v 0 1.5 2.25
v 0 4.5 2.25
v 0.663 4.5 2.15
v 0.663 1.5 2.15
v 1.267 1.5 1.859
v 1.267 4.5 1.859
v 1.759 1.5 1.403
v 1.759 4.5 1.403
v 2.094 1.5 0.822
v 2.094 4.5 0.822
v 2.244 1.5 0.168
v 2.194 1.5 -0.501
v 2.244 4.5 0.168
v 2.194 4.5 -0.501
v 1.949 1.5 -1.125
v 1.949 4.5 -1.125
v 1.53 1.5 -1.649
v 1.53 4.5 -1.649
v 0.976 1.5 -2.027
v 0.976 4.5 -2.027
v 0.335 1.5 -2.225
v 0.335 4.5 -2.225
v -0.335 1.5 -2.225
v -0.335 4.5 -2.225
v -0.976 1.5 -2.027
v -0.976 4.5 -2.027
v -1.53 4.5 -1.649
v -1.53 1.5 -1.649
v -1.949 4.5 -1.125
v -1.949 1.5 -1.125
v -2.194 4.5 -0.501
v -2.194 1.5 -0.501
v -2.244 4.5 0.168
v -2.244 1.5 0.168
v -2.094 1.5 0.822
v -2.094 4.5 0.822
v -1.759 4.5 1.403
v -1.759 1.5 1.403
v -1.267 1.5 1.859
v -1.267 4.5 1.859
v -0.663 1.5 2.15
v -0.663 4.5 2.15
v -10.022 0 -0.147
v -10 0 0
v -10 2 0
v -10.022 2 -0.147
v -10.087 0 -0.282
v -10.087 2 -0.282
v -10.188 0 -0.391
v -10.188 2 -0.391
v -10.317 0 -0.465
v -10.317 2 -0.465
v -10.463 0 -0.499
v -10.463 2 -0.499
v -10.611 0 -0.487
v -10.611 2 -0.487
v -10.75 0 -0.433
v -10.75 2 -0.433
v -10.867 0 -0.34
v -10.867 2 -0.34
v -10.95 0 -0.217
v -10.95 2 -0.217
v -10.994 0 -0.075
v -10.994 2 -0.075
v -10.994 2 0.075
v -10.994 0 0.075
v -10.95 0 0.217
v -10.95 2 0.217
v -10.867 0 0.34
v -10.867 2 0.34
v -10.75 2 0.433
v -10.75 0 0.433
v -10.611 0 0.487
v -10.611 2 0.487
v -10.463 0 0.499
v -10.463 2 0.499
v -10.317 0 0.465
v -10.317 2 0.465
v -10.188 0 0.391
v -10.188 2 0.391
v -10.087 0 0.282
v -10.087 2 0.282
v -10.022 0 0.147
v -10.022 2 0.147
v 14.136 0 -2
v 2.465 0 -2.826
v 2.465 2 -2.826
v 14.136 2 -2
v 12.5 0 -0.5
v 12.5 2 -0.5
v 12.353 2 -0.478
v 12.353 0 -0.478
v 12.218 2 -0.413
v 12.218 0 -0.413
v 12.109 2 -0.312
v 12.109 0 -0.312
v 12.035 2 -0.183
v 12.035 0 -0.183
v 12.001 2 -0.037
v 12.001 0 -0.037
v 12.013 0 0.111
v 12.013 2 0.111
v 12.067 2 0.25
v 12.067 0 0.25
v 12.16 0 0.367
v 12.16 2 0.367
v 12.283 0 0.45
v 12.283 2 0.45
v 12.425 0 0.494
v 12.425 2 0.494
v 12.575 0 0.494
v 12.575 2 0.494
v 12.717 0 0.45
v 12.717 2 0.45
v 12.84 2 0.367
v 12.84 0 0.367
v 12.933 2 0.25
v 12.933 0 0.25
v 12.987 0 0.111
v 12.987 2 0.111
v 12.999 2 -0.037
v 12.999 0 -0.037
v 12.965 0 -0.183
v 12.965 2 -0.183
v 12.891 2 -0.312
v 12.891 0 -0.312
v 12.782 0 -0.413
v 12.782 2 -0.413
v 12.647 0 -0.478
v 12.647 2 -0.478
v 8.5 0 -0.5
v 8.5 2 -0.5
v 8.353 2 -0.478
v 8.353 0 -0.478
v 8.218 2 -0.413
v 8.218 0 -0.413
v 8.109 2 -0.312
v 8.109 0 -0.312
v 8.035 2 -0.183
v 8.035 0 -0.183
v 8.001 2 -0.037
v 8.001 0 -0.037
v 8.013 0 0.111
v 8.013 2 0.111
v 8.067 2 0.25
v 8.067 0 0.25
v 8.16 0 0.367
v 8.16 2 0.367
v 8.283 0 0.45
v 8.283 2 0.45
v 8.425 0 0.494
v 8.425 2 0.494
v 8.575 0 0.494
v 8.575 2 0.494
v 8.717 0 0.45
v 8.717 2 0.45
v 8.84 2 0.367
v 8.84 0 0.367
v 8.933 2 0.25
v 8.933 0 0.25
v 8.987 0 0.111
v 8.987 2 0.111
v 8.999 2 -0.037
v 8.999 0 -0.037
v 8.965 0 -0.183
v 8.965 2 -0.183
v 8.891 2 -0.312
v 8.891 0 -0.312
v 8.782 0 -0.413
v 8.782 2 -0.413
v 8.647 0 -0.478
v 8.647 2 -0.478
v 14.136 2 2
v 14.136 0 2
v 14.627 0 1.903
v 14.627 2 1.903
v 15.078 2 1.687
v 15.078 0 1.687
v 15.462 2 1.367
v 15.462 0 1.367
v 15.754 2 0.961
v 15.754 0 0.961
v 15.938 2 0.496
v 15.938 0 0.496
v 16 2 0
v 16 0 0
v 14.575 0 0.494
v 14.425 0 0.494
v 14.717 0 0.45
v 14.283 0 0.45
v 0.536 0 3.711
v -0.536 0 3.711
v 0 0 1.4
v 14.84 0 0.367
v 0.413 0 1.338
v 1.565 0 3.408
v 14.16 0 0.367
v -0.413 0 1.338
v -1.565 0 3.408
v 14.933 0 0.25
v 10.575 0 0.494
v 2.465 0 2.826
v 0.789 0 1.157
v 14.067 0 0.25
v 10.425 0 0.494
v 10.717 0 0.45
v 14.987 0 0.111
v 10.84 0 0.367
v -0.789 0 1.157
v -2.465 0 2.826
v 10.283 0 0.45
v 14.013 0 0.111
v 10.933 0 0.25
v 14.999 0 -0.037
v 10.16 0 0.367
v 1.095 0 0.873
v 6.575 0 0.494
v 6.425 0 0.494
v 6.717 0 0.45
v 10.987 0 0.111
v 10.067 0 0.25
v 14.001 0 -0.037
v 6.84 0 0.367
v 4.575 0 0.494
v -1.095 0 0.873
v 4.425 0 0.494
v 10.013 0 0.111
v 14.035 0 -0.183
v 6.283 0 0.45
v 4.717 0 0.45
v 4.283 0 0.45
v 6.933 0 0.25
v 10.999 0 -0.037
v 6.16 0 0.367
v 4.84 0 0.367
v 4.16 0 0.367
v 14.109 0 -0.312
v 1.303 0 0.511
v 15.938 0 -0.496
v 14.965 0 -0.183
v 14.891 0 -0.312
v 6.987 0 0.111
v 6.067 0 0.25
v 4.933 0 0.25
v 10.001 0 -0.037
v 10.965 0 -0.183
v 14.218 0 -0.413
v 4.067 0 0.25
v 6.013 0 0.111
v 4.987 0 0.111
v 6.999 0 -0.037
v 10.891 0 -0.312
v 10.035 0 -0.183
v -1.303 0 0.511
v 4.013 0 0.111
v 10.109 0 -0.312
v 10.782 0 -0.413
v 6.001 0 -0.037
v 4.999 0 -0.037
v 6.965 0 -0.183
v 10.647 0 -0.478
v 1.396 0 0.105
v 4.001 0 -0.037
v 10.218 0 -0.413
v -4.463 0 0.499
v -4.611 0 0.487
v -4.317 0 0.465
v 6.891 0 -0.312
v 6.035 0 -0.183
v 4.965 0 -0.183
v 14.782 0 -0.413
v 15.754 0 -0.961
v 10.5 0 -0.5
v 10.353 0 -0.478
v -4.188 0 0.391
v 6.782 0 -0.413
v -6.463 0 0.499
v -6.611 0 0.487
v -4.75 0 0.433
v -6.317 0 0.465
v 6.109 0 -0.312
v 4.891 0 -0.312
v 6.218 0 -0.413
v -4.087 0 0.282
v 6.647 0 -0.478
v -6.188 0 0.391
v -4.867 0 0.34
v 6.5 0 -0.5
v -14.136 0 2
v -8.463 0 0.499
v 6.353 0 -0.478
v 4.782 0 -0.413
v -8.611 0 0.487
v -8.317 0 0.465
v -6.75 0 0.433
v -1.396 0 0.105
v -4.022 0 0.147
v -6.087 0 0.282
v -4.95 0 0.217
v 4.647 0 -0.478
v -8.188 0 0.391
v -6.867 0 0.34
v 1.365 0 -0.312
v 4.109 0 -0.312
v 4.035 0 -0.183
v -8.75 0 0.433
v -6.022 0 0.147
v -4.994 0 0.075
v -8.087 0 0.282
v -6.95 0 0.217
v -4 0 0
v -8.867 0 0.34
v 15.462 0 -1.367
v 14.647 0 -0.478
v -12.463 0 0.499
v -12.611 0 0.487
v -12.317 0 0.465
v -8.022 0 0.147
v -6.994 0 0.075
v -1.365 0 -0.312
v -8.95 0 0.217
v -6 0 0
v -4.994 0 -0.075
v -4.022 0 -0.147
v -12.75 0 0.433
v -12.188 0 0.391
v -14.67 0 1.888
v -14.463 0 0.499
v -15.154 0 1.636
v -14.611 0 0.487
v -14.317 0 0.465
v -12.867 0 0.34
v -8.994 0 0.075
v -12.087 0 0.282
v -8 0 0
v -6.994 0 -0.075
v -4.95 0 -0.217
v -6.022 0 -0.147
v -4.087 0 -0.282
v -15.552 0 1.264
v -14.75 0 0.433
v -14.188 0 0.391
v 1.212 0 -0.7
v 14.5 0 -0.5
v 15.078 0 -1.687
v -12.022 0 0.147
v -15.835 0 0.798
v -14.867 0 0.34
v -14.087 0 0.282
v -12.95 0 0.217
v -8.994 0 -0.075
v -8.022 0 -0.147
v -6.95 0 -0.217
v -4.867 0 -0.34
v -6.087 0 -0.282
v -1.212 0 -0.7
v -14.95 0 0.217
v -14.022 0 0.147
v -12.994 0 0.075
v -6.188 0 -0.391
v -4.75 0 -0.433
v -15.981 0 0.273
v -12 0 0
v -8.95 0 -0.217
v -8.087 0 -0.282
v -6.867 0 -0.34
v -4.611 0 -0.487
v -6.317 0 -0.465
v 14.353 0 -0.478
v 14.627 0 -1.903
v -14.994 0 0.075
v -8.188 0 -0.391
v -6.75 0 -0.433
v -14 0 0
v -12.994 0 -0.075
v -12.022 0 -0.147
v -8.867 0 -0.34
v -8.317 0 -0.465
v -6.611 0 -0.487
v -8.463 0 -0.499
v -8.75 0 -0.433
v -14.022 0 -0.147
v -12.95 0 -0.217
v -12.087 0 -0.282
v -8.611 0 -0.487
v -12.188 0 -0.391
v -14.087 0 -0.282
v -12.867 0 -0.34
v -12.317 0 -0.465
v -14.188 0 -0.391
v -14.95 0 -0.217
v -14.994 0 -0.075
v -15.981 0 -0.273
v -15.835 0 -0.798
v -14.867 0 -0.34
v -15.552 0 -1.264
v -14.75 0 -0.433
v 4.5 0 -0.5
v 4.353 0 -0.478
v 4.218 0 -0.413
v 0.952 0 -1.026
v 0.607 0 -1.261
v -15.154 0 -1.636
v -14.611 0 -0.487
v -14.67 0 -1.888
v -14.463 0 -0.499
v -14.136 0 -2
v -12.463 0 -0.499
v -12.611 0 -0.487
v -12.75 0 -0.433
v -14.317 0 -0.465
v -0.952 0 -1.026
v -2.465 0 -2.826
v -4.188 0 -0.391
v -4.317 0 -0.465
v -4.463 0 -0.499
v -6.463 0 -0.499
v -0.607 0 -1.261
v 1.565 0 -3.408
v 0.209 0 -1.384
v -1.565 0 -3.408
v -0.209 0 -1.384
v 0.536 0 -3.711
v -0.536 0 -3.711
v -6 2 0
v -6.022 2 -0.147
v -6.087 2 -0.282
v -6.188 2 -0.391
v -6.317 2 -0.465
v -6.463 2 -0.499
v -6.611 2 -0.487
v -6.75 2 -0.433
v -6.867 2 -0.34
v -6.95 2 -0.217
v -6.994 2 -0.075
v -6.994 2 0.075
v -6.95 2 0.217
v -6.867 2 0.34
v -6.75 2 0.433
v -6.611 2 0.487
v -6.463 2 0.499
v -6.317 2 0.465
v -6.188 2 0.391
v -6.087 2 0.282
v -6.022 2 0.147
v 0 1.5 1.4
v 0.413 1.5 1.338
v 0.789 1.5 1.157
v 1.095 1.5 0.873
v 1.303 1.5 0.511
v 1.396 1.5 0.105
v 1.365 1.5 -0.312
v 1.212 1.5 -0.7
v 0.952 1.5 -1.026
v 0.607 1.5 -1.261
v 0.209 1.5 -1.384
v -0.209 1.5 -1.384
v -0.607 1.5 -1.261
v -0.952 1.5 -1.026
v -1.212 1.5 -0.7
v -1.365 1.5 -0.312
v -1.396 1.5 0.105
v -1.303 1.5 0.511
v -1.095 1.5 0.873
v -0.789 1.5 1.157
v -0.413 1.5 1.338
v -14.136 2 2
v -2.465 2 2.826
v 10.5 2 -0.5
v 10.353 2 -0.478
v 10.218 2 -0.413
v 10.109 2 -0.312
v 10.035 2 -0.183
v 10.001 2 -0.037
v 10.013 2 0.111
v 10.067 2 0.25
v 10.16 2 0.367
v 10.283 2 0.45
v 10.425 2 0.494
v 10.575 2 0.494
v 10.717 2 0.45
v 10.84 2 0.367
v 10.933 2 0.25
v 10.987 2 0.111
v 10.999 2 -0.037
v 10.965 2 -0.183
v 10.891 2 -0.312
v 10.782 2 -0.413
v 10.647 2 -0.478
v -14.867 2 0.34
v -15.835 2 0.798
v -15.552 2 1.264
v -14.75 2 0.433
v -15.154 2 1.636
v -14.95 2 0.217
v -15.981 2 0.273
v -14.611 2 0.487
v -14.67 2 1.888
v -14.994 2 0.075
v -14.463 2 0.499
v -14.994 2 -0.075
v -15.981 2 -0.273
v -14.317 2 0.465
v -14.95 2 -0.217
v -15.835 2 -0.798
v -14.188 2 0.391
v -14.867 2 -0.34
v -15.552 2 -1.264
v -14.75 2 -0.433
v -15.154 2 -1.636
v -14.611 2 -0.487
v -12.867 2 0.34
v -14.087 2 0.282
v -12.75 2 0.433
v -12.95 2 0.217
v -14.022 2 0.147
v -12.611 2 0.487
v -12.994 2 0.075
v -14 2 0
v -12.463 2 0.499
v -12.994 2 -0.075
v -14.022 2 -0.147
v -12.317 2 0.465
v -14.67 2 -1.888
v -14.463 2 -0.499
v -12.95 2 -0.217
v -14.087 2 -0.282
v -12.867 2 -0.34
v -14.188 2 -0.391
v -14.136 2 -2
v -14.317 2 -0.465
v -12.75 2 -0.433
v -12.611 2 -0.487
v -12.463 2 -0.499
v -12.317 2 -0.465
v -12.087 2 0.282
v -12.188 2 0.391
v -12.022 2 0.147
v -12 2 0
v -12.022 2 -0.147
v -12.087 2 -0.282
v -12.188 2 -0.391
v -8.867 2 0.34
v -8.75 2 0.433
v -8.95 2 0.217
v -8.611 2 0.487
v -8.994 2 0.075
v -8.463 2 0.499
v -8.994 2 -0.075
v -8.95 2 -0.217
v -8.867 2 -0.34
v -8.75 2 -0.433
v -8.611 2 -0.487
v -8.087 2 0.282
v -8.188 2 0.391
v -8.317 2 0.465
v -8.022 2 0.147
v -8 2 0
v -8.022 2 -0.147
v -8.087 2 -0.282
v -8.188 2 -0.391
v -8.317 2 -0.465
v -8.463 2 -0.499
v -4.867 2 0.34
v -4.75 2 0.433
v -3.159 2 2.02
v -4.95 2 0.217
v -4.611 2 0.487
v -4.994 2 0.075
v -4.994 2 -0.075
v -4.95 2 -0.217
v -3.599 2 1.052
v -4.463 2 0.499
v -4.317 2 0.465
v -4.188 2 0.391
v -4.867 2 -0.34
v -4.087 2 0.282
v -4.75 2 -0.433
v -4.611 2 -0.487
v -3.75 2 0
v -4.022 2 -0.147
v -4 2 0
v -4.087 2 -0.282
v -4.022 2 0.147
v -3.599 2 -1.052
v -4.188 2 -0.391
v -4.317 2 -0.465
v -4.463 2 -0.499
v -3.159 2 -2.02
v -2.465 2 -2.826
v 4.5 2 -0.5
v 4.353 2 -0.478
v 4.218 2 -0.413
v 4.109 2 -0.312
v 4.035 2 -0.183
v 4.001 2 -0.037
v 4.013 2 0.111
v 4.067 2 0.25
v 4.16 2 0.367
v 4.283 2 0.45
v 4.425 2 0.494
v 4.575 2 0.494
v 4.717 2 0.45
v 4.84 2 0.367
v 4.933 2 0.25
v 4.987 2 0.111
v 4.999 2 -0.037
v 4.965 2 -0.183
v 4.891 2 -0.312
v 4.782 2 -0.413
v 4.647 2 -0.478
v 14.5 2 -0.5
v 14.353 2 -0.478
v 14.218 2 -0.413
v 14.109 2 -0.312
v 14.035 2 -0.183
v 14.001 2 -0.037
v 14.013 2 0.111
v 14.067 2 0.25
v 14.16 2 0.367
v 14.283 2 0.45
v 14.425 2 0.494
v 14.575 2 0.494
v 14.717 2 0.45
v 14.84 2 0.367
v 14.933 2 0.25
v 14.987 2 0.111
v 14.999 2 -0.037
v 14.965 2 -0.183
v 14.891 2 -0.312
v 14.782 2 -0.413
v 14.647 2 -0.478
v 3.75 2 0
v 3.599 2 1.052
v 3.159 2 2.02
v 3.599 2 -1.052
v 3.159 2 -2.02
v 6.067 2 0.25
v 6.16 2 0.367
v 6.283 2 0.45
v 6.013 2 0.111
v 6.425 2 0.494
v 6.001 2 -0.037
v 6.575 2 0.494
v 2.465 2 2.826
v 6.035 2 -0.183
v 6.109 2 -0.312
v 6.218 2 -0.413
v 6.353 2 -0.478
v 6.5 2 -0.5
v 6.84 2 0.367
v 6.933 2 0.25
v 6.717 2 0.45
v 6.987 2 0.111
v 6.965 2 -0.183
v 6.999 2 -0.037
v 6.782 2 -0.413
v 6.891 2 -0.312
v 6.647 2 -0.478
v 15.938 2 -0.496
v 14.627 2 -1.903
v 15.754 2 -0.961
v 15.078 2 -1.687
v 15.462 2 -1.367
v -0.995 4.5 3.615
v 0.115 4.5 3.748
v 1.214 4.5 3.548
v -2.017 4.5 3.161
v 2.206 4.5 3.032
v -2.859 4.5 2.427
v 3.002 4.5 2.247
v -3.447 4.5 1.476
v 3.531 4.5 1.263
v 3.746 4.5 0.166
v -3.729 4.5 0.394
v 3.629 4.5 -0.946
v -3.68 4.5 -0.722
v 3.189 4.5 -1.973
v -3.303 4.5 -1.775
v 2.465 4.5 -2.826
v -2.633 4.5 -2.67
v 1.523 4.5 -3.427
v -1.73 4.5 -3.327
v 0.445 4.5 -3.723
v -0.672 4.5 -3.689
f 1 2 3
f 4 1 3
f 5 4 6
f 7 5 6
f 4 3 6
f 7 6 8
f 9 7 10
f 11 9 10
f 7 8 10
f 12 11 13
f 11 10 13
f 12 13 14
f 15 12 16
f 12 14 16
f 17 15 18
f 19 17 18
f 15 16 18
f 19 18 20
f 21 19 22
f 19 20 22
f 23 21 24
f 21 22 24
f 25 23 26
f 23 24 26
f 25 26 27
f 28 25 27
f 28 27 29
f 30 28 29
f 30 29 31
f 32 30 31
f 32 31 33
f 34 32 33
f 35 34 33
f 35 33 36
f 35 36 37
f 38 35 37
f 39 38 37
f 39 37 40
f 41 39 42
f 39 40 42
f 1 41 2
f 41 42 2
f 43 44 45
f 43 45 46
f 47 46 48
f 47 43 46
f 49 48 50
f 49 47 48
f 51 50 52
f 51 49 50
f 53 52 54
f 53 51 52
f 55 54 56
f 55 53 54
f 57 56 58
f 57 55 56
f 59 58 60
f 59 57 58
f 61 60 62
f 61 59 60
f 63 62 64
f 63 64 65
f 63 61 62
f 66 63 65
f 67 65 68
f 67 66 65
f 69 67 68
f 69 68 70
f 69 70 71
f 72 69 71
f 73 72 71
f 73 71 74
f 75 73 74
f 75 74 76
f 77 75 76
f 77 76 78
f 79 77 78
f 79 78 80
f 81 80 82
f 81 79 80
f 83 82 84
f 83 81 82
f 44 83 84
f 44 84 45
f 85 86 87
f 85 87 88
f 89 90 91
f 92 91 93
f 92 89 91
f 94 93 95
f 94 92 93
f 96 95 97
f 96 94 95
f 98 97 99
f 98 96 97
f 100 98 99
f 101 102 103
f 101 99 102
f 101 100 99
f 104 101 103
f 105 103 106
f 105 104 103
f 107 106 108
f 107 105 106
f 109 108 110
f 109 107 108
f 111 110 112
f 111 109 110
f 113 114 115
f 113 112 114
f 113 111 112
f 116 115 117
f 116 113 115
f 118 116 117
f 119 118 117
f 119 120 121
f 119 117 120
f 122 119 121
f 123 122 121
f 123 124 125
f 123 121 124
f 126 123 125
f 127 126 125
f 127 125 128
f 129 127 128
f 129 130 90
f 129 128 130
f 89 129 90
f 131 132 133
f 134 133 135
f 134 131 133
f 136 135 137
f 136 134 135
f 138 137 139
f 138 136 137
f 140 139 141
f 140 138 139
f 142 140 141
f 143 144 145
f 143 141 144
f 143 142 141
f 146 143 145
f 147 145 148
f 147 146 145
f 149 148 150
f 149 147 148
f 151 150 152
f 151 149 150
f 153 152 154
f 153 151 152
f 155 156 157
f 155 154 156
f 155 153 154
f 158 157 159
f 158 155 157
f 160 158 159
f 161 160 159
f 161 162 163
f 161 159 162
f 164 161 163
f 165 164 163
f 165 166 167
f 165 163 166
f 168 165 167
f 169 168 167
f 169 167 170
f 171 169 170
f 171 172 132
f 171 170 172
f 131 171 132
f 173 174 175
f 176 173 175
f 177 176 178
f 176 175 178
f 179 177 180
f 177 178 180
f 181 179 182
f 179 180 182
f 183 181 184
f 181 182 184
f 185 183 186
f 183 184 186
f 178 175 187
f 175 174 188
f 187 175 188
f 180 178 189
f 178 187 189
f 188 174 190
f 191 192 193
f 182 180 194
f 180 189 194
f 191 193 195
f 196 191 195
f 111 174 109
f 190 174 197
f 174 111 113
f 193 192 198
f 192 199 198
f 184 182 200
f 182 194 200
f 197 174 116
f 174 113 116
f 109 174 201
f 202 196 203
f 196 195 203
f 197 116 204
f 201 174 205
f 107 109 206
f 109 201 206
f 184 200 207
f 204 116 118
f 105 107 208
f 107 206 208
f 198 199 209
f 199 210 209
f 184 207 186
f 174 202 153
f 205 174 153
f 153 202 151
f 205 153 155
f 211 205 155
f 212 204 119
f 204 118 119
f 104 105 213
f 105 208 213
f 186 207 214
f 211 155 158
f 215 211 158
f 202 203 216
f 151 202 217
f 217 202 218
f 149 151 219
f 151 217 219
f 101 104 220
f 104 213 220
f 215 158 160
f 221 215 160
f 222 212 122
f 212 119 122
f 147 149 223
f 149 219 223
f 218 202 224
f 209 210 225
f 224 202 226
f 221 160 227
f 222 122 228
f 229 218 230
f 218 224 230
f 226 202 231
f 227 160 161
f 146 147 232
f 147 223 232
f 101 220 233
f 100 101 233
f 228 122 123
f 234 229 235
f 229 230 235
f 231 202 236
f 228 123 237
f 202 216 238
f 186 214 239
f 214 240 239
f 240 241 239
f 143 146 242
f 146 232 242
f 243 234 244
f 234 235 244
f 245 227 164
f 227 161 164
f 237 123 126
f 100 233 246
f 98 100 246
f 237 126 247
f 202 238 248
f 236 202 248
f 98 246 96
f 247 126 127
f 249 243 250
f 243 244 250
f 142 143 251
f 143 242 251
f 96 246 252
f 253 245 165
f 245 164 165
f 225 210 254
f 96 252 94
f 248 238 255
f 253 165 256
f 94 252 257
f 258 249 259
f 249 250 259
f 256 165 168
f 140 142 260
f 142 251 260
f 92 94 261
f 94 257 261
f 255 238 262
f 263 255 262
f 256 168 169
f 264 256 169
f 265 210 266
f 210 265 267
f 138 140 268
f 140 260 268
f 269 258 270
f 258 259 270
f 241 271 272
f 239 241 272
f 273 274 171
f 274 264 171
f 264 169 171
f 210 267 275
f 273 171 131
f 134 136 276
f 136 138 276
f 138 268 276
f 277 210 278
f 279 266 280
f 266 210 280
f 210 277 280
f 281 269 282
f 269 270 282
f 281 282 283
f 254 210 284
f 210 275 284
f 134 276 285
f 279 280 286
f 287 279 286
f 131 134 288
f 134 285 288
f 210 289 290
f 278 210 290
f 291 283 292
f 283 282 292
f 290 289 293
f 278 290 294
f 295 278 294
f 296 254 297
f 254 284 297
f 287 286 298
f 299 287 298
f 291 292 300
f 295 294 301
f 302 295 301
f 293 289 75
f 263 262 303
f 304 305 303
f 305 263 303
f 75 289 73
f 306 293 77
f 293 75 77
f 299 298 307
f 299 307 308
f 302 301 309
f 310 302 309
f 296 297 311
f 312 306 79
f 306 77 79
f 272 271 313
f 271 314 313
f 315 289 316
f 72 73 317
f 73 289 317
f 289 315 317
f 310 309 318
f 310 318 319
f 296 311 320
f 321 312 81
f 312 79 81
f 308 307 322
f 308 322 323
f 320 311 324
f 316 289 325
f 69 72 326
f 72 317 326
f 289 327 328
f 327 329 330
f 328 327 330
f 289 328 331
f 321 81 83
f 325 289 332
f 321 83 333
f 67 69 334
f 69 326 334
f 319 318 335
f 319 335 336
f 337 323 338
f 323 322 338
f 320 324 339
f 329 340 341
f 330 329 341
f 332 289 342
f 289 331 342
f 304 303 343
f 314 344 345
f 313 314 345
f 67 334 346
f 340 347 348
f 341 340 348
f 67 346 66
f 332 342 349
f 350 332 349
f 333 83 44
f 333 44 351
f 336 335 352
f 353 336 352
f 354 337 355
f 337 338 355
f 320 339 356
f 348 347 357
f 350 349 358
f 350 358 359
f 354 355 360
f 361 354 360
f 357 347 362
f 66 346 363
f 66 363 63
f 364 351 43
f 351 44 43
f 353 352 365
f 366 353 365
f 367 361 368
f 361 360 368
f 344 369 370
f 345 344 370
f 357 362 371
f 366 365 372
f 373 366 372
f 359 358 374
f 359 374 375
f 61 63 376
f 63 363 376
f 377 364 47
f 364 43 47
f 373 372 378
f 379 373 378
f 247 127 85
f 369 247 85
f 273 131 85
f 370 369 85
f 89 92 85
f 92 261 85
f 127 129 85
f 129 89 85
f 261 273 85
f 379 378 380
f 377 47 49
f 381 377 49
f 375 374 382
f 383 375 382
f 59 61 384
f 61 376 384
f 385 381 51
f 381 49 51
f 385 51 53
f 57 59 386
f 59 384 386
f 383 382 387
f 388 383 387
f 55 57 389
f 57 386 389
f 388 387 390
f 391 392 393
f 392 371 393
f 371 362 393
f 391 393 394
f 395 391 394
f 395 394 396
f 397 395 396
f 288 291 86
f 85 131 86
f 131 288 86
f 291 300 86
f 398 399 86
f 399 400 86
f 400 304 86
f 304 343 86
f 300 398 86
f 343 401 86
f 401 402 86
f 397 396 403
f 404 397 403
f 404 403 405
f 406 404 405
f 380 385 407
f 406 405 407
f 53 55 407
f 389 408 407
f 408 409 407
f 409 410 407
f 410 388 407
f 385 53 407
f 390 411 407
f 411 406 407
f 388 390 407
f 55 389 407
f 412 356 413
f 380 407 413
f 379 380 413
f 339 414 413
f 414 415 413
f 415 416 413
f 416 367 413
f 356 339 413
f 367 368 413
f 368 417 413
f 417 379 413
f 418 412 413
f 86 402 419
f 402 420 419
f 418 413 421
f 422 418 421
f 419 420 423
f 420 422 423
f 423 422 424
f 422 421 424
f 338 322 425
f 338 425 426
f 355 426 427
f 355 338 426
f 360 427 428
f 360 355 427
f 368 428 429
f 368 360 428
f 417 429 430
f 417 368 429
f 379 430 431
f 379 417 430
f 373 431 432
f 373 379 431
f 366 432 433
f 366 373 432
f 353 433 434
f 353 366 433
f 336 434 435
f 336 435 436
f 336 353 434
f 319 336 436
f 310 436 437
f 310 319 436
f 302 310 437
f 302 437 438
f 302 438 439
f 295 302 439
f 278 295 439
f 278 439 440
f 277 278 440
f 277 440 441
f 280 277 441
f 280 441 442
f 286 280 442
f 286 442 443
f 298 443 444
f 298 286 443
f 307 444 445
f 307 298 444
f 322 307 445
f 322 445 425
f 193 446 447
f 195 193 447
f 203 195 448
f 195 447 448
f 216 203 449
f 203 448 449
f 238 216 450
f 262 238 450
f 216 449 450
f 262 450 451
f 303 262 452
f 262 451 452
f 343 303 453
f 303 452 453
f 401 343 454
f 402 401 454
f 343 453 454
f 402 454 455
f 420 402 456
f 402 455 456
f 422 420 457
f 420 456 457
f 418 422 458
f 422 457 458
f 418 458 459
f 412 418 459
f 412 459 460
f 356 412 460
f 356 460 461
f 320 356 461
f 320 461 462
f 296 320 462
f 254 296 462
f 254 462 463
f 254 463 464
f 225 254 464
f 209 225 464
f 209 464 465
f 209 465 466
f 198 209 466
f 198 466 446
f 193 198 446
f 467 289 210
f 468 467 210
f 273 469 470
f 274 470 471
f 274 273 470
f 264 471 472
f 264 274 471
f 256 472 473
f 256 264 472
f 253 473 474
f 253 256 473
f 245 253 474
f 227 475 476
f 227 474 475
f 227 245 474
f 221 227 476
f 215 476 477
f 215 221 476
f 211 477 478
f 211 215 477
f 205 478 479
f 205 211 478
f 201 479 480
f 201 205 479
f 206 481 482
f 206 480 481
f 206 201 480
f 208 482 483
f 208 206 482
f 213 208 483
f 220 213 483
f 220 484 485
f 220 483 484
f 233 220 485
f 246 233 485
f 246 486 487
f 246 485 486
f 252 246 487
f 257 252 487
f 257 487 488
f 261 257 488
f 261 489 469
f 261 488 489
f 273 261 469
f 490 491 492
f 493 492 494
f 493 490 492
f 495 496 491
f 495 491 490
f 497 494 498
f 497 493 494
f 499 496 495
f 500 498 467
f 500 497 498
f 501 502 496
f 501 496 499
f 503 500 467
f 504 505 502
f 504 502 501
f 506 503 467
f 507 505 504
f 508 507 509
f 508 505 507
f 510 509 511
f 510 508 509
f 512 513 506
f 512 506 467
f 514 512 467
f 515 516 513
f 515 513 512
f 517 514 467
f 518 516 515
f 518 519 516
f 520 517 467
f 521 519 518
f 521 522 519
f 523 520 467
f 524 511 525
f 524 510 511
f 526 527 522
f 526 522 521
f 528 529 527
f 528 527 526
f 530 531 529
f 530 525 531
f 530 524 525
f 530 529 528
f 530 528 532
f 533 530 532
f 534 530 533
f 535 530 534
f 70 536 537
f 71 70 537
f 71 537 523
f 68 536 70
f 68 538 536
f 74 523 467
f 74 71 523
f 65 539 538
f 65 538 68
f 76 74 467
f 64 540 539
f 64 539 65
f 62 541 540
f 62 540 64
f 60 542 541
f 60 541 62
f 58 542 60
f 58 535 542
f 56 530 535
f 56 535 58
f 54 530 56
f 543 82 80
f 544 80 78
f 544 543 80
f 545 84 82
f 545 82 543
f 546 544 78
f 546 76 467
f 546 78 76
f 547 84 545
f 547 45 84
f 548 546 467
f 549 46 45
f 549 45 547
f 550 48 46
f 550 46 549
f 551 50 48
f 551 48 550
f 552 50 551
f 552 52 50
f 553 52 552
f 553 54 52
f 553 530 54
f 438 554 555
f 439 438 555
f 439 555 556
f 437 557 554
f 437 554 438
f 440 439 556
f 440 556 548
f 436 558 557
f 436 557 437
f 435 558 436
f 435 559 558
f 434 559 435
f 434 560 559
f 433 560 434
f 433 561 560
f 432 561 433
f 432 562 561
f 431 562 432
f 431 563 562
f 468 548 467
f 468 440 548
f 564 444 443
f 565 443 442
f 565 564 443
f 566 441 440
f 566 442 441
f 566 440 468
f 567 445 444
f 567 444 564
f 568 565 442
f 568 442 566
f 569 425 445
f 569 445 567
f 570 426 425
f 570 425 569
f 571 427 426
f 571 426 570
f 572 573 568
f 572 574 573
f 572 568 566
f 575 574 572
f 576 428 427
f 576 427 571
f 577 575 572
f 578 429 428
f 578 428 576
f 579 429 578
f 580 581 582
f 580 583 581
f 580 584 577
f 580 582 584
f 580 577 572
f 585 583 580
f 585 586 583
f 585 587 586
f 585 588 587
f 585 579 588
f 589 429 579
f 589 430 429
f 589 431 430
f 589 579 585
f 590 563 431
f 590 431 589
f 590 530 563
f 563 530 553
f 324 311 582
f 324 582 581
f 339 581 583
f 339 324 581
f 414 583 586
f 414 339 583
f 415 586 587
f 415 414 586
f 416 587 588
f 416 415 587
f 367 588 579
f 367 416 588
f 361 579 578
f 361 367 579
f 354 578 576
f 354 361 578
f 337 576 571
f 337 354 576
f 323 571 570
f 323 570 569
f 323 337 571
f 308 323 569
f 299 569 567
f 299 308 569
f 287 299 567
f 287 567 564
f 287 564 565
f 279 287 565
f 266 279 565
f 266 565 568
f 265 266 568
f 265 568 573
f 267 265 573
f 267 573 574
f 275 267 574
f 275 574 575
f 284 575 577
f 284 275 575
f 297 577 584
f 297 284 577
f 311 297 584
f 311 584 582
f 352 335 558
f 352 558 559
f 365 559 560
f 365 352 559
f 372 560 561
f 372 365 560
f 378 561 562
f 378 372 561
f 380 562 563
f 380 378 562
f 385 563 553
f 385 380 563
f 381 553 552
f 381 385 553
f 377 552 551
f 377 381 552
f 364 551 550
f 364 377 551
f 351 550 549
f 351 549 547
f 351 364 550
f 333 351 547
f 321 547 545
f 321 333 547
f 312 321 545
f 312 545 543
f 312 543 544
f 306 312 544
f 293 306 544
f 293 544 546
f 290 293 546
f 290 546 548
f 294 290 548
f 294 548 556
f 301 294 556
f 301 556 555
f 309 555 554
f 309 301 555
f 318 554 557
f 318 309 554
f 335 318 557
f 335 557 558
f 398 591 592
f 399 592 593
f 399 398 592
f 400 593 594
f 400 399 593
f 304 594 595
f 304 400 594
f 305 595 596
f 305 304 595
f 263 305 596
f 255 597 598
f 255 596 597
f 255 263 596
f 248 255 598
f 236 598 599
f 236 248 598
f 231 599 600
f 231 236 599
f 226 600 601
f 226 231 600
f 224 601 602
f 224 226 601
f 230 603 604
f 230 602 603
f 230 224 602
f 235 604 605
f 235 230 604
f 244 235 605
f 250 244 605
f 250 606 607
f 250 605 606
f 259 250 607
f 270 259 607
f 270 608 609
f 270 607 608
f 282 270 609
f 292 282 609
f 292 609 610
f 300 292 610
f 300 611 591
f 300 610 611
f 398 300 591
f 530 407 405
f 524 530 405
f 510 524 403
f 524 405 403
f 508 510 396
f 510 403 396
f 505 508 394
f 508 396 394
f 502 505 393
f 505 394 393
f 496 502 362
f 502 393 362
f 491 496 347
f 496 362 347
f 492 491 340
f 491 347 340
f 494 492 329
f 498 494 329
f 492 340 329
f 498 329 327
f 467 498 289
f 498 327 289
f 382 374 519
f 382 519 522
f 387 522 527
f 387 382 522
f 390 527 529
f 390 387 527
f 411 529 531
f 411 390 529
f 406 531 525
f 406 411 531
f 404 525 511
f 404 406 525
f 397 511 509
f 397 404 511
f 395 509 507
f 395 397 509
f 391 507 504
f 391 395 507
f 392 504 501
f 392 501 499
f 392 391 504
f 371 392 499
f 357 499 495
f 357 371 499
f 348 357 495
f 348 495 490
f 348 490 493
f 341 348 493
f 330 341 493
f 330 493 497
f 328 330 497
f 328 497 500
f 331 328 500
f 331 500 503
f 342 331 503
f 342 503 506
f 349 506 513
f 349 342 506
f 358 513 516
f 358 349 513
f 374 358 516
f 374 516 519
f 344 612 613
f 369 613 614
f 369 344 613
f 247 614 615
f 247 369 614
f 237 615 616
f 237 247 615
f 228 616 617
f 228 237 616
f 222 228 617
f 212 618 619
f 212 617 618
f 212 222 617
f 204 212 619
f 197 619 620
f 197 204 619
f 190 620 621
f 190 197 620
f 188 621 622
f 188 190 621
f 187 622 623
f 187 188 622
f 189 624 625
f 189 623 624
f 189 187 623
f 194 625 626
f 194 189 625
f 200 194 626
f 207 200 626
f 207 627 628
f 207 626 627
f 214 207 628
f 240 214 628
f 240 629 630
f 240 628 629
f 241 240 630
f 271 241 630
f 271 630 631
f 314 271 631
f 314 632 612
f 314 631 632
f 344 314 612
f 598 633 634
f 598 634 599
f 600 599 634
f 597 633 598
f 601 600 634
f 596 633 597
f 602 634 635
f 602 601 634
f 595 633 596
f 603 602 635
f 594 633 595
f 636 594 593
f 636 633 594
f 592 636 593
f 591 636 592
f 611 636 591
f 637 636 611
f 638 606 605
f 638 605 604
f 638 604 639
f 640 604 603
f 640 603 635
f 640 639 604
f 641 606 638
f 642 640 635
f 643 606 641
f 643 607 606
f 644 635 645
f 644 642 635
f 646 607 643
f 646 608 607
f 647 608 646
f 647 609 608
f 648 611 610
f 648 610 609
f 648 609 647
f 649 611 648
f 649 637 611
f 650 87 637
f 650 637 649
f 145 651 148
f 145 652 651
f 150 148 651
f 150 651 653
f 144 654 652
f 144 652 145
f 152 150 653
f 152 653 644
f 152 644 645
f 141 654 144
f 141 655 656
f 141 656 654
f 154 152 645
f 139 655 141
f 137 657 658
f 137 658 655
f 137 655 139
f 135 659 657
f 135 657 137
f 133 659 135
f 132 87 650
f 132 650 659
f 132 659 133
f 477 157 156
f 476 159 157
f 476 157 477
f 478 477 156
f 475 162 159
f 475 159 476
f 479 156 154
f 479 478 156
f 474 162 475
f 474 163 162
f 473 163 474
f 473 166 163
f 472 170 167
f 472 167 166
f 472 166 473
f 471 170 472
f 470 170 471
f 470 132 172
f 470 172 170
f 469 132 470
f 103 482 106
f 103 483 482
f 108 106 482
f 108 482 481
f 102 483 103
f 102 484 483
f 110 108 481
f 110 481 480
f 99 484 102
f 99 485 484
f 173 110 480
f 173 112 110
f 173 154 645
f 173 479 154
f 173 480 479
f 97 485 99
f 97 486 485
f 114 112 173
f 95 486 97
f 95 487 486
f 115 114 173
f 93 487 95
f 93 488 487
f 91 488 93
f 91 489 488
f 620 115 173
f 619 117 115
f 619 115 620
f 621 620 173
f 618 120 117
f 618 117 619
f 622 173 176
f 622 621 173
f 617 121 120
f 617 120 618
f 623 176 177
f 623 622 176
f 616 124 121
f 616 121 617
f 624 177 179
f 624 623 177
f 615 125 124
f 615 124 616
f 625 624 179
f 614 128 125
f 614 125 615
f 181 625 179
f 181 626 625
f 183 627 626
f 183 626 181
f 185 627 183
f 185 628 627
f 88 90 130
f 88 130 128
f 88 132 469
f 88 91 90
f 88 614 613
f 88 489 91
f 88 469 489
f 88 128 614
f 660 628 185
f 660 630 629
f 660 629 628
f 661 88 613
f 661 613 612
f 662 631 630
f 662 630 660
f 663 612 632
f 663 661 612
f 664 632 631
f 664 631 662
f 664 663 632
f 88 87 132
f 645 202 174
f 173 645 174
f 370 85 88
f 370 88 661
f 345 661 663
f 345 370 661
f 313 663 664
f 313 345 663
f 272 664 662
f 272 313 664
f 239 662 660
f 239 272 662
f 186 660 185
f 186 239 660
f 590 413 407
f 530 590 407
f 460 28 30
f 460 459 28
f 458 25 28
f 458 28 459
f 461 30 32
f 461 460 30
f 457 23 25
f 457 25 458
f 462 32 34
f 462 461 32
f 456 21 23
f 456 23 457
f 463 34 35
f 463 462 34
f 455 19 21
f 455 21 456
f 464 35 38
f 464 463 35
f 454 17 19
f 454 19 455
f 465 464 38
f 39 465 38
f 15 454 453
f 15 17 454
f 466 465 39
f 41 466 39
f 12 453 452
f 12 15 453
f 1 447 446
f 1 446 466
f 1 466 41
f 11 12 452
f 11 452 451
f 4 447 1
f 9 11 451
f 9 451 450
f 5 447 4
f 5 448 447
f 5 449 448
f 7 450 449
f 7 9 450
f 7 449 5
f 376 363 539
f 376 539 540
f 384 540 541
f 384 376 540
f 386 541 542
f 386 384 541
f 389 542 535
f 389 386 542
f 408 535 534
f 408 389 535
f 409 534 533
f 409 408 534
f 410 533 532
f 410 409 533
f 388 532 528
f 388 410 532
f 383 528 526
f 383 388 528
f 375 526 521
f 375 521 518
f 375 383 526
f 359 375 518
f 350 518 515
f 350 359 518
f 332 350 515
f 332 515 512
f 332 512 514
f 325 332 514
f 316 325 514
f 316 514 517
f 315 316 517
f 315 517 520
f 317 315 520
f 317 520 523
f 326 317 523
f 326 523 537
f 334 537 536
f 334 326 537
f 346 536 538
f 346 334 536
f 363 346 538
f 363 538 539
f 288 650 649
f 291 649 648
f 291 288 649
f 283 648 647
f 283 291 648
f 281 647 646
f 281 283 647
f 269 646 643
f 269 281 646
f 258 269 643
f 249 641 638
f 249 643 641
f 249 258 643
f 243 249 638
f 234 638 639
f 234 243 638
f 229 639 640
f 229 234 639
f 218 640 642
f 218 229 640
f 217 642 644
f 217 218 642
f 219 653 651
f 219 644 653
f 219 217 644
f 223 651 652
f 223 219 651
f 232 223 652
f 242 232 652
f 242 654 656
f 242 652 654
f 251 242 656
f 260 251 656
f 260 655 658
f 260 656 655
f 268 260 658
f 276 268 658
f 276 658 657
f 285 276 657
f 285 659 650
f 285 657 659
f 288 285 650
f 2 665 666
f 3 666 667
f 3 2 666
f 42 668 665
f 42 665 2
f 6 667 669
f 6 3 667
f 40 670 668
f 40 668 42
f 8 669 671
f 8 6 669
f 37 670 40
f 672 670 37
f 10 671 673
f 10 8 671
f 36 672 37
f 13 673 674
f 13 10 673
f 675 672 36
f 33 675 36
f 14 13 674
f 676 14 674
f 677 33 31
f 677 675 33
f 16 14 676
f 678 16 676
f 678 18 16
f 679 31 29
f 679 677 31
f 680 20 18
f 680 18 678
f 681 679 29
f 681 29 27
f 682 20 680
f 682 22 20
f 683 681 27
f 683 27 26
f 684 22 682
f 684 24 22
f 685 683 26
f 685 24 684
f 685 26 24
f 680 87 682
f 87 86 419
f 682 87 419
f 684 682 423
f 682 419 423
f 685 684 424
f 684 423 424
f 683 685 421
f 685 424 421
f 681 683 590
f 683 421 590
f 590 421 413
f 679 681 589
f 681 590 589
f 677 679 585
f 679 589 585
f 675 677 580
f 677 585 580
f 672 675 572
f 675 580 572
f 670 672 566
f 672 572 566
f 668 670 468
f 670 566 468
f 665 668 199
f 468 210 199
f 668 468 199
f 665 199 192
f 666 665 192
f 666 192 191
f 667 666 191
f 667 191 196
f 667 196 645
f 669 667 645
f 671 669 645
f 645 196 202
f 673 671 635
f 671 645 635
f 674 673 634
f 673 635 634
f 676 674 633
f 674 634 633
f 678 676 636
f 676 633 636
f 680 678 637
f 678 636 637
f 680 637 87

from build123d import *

# Parameters (mm, degrees)
BOSS_EXTRUDE1_DEPTH = 2
SKETCH5_R           = 0.5
CUT_EXTRUDE5_DEPTH  = 3
LPATTERN1_COUNT     = 6
LPATTERN1_PITCH     = 2
MIRROR2_OUTLINE_R   = 0.5
MIRROR2_DEPTH       = 2
SKETCH2_R           = 3.75
BOSS_EXTRUDE2_DEPTH = 4.5
SKETCH3_R           = 2.25
CUT_EXTRUDE1_DEPTH  = 3
SKETCH4_R           = 1.4
CUT_EXTRUDE2_DEPTH  = 3


# Read off the part's stored shape, not the designer's step: Mirror2
with BuildPart() as part:
    # Sketch1 → Boss-Extrude1 (new body)
    with BuildSketch(Plane(origin=(0, 0, 0), x_dir=(1, 0, 0), z_dir=(0, 1, 0))):
        with BuildLine():
            Line((0, 3), (14.136480176, 2))
            ThreePointArc((14.136480176, 2), (15.461917194, 1.366812545), (16, 0))
            Line((16, 0), (0, 0))
            Line((0, 0), (0, 3))
        make_face()
    boss_extrude1 = extrude(amount=BOSS_EXTRUDE1_DEPTH)

    # Mirror1: Boss-Extrude1 across plane
    add(boss_extrude1.mirror(Plane.XY))

    # Sketch5 → Cut-Extrude5 (cut)
    with BuildSketch(Plane(origin=(0, 0, 0), x_dir=(1, 0, 0), z_dir=(0, 1, 0))):
        with Locations(Location((4.5, 0, 0), (0, 0, 90))):
            Circle(SKETCH5_R)
    cut_extrude5 = extrude(amount=CUT_EXTRUDE5_DEPTH, mode=Mode.SUBTRACT)

    # LPattern1: Cut-Extrude5 ×6
    with Locations(*[(i * LPATTERN1_PITCH, 0, 0) for i in range(1, LPATTERN1_COUNT)]):
        add(cut_extrude5, mode=Mode.SUBTRACT)

    # Mirror2 outline → Mirror2 (add)
    with BuildSketch(Plane(origin=(0, 0, 0), x_dir=(1, 0, 0), z_dir=(0, 1, 0))):
        with BuildLine():
            Line((0, -3), (0, 3))
            Line((0, 3), (-14.136480176, 2))
            ThreePointArc((-14.136480176, 2), (-16, 0), (-14.136480176, -2))
            Line((-14.136480176, -2), (0, -3))
        make_face()
        with Locations((-14.5, 0)):
            Circle(MIRROR2_OUTLINE_R, mode=Mode.SUBTRACT)
        with Locations((-12.5, 0)):
            Circle(MIRROR2_OUTLINE_R, mode=Mode.SUBTRACT)
        with Locations((-10.5, 0)):
            Circle(MIRROR2_OUTLINE_R, mode=Mode.SUBTRACT)
        with Locations((-8.5, 0)):
            Circle(MIRROR2_OUTLINE_R, mode=Mode.SUBTRACT)
        with Locations((-6.5, 0)):
            Circle(MIRROR2_OUTLINE_R, mode=Mode.SUBTRACT)
        with Locations((-4.5, 0)):
            Circle(MIRROR2_OUTLINE_R, mode=Mode.SUBTRACT)
    extrude(amount=MIRROR2_DEPTH)

    # Sketch2 → Boss-Extrude2 (add)
    with BuildSketch(Plane(origin=(0, 0, 0), x_dir=(1, 0, 0), z_dir=(0, 1, 0))):
        with Locations(Location((0, 0, 0), (0, 0, 48.893793678))):
            Circle(SKETCH2_R)
    extrude(amount=BOSS_EXTRUDE2_DEPTH)

    # Sketch3 → Cut-Extrude1 (cut)
    with BuildSketch(Plane(origin=(0, 4.5, 0), x_dir=(1, 0, 0), z_dir=(0, 1, 0))):
        with Locations(Location((0, 0, 0), (0, 0, 270))):
            Circle(SKETCH3_R)
    extrude(amount=-CUT_EXTRUDE1_DEPTH, mode=Mode.SUBTRACT)

    # Sketch4 → Cut-Extrude2 (cut)
    with BuildSketch(Plane(origin=(0, 1.5, 0), x_dir=(1, 0, 0), z_dir=(0, 1, 0))):
        with Locations(Location((0, 0, 0), (0, 0, 270))):
            Circle(SKETCH4_R)
    extrude(amount=-CUT_EXTRUDE2_DEPTH, mode=Mode.SUBTRACT)


solid = part.part
